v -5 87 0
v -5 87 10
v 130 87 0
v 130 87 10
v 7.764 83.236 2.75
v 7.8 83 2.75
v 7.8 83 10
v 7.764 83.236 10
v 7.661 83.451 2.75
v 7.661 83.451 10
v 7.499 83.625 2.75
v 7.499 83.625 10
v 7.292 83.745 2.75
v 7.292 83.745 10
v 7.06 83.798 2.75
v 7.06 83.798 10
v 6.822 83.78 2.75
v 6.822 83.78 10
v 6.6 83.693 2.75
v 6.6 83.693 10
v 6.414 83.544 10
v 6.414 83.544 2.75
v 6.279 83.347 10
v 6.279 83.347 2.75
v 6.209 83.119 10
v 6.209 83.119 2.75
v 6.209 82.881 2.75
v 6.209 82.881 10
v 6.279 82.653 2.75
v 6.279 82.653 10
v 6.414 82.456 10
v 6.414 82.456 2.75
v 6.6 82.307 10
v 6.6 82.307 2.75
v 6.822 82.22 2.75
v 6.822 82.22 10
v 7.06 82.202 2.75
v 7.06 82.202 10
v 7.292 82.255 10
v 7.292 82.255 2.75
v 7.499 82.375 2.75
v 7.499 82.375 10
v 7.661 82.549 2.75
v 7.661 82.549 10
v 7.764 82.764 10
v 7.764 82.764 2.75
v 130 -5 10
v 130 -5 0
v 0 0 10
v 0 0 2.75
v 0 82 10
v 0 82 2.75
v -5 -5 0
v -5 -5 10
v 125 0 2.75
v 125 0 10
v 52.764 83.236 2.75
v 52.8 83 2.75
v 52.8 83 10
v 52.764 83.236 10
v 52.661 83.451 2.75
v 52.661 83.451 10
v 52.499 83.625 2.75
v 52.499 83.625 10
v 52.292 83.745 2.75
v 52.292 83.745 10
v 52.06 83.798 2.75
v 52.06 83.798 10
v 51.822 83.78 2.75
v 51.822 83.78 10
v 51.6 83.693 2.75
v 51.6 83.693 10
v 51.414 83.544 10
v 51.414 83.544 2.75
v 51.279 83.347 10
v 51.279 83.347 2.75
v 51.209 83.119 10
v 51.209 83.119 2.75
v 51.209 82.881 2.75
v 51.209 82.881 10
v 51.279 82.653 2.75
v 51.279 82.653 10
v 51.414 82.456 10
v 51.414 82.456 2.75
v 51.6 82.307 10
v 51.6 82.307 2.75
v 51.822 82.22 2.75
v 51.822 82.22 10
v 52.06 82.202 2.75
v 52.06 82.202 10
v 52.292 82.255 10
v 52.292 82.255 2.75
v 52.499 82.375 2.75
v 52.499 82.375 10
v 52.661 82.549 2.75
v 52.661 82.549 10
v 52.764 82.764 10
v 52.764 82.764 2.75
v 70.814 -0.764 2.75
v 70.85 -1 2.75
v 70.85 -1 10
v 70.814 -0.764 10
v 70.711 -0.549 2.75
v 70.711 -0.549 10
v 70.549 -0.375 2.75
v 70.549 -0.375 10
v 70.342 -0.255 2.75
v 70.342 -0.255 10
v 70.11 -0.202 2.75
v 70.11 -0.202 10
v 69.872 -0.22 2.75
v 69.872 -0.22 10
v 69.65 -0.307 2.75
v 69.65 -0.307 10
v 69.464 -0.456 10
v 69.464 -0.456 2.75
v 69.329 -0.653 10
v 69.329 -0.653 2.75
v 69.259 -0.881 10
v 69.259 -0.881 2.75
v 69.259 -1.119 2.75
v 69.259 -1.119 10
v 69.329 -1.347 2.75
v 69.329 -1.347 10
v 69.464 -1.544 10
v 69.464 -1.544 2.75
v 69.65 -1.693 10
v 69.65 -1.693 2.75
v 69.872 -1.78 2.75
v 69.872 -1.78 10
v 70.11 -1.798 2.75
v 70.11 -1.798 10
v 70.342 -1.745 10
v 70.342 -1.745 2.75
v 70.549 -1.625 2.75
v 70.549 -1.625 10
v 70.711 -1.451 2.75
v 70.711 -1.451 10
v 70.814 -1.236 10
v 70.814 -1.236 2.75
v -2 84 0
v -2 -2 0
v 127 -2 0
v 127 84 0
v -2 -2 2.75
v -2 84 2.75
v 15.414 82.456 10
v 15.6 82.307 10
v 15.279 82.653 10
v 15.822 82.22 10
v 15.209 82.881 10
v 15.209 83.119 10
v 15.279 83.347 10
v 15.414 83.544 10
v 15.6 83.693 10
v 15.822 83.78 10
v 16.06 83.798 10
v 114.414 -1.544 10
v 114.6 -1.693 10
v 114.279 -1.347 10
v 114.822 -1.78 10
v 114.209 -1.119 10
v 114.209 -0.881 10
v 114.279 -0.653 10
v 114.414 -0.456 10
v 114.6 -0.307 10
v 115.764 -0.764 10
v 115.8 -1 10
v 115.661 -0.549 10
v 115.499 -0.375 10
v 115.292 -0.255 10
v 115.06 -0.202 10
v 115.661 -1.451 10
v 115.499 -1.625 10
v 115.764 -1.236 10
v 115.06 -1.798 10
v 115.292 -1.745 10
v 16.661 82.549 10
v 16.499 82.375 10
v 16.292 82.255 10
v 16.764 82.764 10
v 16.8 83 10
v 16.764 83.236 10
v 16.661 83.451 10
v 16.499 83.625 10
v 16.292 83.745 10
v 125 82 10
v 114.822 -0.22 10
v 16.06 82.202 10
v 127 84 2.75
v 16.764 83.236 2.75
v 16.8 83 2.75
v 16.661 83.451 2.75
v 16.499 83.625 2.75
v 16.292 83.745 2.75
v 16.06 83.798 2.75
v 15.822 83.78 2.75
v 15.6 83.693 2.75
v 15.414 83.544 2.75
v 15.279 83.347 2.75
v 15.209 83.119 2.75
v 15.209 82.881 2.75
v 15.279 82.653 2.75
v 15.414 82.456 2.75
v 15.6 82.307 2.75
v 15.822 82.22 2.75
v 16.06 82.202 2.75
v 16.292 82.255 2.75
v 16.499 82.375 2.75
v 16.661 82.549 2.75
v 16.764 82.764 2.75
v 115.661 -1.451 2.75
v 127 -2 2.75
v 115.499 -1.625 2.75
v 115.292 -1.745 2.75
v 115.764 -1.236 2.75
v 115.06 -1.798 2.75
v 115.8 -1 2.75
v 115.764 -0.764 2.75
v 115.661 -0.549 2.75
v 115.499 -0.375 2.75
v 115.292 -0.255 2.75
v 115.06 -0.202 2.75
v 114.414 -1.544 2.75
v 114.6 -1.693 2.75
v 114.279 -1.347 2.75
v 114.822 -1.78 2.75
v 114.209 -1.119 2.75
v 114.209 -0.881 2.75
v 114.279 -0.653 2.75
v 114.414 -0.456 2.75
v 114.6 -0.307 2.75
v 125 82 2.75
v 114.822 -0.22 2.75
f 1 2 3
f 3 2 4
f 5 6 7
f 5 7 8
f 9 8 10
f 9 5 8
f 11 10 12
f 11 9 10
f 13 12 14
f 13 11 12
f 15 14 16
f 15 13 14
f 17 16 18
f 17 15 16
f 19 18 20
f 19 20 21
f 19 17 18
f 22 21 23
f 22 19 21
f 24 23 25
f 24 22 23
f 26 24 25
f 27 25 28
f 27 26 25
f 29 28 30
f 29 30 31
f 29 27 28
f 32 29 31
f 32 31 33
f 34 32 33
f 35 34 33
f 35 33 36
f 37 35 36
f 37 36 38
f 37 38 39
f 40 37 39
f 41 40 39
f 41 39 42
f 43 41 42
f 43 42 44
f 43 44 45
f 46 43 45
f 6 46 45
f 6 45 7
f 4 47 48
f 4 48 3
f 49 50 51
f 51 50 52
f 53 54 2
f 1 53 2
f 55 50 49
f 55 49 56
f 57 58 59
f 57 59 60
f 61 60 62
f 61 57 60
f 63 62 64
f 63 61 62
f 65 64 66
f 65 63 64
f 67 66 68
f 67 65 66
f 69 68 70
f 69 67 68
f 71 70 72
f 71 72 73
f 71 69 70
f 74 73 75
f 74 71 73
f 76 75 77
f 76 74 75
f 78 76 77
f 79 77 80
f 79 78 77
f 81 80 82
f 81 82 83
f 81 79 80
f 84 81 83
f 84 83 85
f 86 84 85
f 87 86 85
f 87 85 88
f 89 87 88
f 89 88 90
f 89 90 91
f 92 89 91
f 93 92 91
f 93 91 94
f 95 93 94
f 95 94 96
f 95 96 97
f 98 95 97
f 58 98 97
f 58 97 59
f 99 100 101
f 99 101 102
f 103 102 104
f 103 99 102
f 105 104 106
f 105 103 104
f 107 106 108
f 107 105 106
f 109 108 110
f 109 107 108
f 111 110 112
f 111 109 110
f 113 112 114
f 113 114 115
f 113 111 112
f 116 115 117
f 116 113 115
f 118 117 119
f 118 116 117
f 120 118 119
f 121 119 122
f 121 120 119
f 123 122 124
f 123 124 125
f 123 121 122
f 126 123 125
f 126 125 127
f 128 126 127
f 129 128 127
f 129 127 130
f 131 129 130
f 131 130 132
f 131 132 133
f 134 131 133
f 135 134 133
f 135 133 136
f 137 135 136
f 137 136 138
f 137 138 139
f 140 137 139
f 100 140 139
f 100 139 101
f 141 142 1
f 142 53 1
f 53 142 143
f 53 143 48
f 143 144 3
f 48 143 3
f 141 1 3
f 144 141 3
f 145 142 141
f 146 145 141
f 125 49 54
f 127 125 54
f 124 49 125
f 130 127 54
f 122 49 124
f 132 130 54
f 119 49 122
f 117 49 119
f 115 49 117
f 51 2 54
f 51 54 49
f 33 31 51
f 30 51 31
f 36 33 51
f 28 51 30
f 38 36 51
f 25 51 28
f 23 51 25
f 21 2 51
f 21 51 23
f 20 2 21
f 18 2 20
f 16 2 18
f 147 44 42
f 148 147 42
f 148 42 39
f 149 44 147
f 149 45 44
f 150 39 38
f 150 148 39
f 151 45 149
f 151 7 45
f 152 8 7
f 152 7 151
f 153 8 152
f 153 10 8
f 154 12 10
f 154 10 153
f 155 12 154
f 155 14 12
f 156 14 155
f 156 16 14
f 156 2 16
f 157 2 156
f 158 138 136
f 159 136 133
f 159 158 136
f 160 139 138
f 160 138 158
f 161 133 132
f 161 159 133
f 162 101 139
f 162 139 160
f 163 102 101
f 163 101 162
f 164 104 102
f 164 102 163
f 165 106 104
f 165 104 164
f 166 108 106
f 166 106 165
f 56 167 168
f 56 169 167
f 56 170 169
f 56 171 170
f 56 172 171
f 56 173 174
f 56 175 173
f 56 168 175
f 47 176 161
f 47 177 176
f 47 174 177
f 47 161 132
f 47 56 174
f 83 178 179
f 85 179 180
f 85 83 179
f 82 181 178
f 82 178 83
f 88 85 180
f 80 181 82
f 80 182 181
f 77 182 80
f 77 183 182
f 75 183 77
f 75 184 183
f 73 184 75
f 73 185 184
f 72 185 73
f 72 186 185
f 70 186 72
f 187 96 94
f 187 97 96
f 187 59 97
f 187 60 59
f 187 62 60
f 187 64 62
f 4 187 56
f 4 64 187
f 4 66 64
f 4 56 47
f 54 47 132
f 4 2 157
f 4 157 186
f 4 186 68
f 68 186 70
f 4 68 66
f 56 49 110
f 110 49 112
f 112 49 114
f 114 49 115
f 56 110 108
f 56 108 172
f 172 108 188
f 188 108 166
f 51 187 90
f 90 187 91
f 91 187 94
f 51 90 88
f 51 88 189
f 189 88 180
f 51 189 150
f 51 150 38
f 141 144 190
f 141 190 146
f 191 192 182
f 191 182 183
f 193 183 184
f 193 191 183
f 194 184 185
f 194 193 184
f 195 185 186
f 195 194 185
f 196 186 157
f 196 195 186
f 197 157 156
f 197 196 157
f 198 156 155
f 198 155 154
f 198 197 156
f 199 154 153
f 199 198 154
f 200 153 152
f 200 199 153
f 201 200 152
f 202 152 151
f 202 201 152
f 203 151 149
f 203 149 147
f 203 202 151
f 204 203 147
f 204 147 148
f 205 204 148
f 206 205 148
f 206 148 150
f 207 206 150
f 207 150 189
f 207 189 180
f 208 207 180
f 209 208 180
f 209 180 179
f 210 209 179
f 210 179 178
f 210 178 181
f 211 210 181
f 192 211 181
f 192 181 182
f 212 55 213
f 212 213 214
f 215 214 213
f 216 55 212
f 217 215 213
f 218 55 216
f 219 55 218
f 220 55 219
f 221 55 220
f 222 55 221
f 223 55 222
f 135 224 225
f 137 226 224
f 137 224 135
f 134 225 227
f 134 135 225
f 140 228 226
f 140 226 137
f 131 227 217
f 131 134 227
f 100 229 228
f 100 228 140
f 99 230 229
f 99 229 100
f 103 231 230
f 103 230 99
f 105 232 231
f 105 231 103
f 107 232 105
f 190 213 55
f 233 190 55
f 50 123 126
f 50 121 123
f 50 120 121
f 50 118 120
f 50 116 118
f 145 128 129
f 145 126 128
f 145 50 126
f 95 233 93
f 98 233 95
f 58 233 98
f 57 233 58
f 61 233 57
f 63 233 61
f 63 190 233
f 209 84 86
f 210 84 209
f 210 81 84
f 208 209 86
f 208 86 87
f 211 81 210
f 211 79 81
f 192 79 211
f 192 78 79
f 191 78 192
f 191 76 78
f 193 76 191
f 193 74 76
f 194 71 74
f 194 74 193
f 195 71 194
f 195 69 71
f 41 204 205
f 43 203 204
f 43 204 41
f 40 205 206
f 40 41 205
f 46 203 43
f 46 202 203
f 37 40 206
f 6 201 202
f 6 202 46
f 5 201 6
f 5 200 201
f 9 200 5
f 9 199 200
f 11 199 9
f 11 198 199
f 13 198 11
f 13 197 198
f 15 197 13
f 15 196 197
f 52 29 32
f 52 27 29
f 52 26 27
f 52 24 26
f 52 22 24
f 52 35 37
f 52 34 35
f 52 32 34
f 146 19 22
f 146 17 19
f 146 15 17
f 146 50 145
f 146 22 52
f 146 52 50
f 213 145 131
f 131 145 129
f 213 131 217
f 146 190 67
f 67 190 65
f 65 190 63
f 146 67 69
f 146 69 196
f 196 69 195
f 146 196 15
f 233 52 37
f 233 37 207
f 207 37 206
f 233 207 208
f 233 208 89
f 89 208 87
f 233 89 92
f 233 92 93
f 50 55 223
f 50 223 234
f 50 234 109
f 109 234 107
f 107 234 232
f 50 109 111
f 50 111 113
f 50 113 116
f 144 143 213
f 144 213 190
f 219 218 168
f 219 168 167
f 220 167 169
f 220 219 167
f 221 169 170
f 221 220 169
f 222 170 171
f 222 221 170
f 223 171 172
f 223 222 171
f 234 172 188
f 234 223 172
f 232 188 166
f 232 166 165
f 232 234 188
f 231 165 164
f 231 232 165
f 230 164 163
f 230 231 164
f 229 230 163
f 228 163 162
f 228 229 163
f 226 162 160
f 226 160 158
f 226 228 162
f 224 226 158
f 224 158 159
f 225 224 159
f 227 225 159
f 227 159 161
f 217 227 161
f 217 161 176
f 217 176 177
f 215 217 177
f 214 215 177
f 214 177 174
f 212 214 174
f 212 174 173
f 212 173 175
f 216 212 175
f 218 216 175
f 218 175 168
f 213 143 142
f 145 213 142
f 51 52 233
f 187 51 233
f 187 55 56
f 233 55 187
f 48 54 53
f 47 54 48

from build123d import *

# Parameters (mm, degrees)
SKETCH_1_W           = 135
SKETCH_1_H           = 92
SKETCH_1_R           = 0.8
SKETCH_1_W_2         = 125
SKETCH_1_H_2         = 82
EXTRUDE_1_DEPTH      = 10
EXTRUDE_1_DEPTH_BACK = 0.0001
SKETCH_4_W           = 129
SKETCH_4_H           = 86
CUT_EXTRUDE_1_DEPTH  = 2.75


with BuildPart() as part:
    # Эскиз1 → Бобышка-Вытянуть1 (new body, two sides)
    with BuildSketch(Plane.XY) as extrude_1_sk:
        with Locations((62.5, 41)):
            Rectangle(SKETCH_1_W, SKETCH_1_H)
        with Locations((7, 83)):
            Circle(SKETCH_1_R, mode=Mode.SUBTRACT)
        with Locations((115, -1)):
            Circle(SKETCH_1_R, mode=Mode.SUBTRACT)
        with Locations((16, 83)):
            Circle(SKETCH_1_R, mode=Mode.SUBTRACT)
        with Locations((52, 83)):
            Circle(SKETCH_1_R, mode=Mode.SUBTRACT)
        with Locations((70.05, -1)):
            Circle(SKETCH_1_R, mode=Mode.SUBTRACT)
        with Locations((62.5, 41)):
            Rectangle(SKETCH_1_W_2, SKETCH_1_H_2, mode=Mode.SUBTRACT)
    extrude(amount=EXTRUDE_1_DEPTH)
    extrude(extrude_1_sk.sketch, amount=-EXTRUDE_1_DEPTH_BACK)

    # Эскиз4 → Вырез-Вытянуть1 (cut)
    with BuildSketch(Plane(origin=(0, 0, -0.0001), x_dir=(-1, 0, 0), z_dir=(0, 0, -1))):
        with Locations((-62.5, 41)):
            Rectangle(SKETCH_4_W, SKETCH_4_H)
    extrude(amount=-CUT_EXTRUDE_1_DEPTH, mode=Mode.SUBTRACT)


solid = part.part
